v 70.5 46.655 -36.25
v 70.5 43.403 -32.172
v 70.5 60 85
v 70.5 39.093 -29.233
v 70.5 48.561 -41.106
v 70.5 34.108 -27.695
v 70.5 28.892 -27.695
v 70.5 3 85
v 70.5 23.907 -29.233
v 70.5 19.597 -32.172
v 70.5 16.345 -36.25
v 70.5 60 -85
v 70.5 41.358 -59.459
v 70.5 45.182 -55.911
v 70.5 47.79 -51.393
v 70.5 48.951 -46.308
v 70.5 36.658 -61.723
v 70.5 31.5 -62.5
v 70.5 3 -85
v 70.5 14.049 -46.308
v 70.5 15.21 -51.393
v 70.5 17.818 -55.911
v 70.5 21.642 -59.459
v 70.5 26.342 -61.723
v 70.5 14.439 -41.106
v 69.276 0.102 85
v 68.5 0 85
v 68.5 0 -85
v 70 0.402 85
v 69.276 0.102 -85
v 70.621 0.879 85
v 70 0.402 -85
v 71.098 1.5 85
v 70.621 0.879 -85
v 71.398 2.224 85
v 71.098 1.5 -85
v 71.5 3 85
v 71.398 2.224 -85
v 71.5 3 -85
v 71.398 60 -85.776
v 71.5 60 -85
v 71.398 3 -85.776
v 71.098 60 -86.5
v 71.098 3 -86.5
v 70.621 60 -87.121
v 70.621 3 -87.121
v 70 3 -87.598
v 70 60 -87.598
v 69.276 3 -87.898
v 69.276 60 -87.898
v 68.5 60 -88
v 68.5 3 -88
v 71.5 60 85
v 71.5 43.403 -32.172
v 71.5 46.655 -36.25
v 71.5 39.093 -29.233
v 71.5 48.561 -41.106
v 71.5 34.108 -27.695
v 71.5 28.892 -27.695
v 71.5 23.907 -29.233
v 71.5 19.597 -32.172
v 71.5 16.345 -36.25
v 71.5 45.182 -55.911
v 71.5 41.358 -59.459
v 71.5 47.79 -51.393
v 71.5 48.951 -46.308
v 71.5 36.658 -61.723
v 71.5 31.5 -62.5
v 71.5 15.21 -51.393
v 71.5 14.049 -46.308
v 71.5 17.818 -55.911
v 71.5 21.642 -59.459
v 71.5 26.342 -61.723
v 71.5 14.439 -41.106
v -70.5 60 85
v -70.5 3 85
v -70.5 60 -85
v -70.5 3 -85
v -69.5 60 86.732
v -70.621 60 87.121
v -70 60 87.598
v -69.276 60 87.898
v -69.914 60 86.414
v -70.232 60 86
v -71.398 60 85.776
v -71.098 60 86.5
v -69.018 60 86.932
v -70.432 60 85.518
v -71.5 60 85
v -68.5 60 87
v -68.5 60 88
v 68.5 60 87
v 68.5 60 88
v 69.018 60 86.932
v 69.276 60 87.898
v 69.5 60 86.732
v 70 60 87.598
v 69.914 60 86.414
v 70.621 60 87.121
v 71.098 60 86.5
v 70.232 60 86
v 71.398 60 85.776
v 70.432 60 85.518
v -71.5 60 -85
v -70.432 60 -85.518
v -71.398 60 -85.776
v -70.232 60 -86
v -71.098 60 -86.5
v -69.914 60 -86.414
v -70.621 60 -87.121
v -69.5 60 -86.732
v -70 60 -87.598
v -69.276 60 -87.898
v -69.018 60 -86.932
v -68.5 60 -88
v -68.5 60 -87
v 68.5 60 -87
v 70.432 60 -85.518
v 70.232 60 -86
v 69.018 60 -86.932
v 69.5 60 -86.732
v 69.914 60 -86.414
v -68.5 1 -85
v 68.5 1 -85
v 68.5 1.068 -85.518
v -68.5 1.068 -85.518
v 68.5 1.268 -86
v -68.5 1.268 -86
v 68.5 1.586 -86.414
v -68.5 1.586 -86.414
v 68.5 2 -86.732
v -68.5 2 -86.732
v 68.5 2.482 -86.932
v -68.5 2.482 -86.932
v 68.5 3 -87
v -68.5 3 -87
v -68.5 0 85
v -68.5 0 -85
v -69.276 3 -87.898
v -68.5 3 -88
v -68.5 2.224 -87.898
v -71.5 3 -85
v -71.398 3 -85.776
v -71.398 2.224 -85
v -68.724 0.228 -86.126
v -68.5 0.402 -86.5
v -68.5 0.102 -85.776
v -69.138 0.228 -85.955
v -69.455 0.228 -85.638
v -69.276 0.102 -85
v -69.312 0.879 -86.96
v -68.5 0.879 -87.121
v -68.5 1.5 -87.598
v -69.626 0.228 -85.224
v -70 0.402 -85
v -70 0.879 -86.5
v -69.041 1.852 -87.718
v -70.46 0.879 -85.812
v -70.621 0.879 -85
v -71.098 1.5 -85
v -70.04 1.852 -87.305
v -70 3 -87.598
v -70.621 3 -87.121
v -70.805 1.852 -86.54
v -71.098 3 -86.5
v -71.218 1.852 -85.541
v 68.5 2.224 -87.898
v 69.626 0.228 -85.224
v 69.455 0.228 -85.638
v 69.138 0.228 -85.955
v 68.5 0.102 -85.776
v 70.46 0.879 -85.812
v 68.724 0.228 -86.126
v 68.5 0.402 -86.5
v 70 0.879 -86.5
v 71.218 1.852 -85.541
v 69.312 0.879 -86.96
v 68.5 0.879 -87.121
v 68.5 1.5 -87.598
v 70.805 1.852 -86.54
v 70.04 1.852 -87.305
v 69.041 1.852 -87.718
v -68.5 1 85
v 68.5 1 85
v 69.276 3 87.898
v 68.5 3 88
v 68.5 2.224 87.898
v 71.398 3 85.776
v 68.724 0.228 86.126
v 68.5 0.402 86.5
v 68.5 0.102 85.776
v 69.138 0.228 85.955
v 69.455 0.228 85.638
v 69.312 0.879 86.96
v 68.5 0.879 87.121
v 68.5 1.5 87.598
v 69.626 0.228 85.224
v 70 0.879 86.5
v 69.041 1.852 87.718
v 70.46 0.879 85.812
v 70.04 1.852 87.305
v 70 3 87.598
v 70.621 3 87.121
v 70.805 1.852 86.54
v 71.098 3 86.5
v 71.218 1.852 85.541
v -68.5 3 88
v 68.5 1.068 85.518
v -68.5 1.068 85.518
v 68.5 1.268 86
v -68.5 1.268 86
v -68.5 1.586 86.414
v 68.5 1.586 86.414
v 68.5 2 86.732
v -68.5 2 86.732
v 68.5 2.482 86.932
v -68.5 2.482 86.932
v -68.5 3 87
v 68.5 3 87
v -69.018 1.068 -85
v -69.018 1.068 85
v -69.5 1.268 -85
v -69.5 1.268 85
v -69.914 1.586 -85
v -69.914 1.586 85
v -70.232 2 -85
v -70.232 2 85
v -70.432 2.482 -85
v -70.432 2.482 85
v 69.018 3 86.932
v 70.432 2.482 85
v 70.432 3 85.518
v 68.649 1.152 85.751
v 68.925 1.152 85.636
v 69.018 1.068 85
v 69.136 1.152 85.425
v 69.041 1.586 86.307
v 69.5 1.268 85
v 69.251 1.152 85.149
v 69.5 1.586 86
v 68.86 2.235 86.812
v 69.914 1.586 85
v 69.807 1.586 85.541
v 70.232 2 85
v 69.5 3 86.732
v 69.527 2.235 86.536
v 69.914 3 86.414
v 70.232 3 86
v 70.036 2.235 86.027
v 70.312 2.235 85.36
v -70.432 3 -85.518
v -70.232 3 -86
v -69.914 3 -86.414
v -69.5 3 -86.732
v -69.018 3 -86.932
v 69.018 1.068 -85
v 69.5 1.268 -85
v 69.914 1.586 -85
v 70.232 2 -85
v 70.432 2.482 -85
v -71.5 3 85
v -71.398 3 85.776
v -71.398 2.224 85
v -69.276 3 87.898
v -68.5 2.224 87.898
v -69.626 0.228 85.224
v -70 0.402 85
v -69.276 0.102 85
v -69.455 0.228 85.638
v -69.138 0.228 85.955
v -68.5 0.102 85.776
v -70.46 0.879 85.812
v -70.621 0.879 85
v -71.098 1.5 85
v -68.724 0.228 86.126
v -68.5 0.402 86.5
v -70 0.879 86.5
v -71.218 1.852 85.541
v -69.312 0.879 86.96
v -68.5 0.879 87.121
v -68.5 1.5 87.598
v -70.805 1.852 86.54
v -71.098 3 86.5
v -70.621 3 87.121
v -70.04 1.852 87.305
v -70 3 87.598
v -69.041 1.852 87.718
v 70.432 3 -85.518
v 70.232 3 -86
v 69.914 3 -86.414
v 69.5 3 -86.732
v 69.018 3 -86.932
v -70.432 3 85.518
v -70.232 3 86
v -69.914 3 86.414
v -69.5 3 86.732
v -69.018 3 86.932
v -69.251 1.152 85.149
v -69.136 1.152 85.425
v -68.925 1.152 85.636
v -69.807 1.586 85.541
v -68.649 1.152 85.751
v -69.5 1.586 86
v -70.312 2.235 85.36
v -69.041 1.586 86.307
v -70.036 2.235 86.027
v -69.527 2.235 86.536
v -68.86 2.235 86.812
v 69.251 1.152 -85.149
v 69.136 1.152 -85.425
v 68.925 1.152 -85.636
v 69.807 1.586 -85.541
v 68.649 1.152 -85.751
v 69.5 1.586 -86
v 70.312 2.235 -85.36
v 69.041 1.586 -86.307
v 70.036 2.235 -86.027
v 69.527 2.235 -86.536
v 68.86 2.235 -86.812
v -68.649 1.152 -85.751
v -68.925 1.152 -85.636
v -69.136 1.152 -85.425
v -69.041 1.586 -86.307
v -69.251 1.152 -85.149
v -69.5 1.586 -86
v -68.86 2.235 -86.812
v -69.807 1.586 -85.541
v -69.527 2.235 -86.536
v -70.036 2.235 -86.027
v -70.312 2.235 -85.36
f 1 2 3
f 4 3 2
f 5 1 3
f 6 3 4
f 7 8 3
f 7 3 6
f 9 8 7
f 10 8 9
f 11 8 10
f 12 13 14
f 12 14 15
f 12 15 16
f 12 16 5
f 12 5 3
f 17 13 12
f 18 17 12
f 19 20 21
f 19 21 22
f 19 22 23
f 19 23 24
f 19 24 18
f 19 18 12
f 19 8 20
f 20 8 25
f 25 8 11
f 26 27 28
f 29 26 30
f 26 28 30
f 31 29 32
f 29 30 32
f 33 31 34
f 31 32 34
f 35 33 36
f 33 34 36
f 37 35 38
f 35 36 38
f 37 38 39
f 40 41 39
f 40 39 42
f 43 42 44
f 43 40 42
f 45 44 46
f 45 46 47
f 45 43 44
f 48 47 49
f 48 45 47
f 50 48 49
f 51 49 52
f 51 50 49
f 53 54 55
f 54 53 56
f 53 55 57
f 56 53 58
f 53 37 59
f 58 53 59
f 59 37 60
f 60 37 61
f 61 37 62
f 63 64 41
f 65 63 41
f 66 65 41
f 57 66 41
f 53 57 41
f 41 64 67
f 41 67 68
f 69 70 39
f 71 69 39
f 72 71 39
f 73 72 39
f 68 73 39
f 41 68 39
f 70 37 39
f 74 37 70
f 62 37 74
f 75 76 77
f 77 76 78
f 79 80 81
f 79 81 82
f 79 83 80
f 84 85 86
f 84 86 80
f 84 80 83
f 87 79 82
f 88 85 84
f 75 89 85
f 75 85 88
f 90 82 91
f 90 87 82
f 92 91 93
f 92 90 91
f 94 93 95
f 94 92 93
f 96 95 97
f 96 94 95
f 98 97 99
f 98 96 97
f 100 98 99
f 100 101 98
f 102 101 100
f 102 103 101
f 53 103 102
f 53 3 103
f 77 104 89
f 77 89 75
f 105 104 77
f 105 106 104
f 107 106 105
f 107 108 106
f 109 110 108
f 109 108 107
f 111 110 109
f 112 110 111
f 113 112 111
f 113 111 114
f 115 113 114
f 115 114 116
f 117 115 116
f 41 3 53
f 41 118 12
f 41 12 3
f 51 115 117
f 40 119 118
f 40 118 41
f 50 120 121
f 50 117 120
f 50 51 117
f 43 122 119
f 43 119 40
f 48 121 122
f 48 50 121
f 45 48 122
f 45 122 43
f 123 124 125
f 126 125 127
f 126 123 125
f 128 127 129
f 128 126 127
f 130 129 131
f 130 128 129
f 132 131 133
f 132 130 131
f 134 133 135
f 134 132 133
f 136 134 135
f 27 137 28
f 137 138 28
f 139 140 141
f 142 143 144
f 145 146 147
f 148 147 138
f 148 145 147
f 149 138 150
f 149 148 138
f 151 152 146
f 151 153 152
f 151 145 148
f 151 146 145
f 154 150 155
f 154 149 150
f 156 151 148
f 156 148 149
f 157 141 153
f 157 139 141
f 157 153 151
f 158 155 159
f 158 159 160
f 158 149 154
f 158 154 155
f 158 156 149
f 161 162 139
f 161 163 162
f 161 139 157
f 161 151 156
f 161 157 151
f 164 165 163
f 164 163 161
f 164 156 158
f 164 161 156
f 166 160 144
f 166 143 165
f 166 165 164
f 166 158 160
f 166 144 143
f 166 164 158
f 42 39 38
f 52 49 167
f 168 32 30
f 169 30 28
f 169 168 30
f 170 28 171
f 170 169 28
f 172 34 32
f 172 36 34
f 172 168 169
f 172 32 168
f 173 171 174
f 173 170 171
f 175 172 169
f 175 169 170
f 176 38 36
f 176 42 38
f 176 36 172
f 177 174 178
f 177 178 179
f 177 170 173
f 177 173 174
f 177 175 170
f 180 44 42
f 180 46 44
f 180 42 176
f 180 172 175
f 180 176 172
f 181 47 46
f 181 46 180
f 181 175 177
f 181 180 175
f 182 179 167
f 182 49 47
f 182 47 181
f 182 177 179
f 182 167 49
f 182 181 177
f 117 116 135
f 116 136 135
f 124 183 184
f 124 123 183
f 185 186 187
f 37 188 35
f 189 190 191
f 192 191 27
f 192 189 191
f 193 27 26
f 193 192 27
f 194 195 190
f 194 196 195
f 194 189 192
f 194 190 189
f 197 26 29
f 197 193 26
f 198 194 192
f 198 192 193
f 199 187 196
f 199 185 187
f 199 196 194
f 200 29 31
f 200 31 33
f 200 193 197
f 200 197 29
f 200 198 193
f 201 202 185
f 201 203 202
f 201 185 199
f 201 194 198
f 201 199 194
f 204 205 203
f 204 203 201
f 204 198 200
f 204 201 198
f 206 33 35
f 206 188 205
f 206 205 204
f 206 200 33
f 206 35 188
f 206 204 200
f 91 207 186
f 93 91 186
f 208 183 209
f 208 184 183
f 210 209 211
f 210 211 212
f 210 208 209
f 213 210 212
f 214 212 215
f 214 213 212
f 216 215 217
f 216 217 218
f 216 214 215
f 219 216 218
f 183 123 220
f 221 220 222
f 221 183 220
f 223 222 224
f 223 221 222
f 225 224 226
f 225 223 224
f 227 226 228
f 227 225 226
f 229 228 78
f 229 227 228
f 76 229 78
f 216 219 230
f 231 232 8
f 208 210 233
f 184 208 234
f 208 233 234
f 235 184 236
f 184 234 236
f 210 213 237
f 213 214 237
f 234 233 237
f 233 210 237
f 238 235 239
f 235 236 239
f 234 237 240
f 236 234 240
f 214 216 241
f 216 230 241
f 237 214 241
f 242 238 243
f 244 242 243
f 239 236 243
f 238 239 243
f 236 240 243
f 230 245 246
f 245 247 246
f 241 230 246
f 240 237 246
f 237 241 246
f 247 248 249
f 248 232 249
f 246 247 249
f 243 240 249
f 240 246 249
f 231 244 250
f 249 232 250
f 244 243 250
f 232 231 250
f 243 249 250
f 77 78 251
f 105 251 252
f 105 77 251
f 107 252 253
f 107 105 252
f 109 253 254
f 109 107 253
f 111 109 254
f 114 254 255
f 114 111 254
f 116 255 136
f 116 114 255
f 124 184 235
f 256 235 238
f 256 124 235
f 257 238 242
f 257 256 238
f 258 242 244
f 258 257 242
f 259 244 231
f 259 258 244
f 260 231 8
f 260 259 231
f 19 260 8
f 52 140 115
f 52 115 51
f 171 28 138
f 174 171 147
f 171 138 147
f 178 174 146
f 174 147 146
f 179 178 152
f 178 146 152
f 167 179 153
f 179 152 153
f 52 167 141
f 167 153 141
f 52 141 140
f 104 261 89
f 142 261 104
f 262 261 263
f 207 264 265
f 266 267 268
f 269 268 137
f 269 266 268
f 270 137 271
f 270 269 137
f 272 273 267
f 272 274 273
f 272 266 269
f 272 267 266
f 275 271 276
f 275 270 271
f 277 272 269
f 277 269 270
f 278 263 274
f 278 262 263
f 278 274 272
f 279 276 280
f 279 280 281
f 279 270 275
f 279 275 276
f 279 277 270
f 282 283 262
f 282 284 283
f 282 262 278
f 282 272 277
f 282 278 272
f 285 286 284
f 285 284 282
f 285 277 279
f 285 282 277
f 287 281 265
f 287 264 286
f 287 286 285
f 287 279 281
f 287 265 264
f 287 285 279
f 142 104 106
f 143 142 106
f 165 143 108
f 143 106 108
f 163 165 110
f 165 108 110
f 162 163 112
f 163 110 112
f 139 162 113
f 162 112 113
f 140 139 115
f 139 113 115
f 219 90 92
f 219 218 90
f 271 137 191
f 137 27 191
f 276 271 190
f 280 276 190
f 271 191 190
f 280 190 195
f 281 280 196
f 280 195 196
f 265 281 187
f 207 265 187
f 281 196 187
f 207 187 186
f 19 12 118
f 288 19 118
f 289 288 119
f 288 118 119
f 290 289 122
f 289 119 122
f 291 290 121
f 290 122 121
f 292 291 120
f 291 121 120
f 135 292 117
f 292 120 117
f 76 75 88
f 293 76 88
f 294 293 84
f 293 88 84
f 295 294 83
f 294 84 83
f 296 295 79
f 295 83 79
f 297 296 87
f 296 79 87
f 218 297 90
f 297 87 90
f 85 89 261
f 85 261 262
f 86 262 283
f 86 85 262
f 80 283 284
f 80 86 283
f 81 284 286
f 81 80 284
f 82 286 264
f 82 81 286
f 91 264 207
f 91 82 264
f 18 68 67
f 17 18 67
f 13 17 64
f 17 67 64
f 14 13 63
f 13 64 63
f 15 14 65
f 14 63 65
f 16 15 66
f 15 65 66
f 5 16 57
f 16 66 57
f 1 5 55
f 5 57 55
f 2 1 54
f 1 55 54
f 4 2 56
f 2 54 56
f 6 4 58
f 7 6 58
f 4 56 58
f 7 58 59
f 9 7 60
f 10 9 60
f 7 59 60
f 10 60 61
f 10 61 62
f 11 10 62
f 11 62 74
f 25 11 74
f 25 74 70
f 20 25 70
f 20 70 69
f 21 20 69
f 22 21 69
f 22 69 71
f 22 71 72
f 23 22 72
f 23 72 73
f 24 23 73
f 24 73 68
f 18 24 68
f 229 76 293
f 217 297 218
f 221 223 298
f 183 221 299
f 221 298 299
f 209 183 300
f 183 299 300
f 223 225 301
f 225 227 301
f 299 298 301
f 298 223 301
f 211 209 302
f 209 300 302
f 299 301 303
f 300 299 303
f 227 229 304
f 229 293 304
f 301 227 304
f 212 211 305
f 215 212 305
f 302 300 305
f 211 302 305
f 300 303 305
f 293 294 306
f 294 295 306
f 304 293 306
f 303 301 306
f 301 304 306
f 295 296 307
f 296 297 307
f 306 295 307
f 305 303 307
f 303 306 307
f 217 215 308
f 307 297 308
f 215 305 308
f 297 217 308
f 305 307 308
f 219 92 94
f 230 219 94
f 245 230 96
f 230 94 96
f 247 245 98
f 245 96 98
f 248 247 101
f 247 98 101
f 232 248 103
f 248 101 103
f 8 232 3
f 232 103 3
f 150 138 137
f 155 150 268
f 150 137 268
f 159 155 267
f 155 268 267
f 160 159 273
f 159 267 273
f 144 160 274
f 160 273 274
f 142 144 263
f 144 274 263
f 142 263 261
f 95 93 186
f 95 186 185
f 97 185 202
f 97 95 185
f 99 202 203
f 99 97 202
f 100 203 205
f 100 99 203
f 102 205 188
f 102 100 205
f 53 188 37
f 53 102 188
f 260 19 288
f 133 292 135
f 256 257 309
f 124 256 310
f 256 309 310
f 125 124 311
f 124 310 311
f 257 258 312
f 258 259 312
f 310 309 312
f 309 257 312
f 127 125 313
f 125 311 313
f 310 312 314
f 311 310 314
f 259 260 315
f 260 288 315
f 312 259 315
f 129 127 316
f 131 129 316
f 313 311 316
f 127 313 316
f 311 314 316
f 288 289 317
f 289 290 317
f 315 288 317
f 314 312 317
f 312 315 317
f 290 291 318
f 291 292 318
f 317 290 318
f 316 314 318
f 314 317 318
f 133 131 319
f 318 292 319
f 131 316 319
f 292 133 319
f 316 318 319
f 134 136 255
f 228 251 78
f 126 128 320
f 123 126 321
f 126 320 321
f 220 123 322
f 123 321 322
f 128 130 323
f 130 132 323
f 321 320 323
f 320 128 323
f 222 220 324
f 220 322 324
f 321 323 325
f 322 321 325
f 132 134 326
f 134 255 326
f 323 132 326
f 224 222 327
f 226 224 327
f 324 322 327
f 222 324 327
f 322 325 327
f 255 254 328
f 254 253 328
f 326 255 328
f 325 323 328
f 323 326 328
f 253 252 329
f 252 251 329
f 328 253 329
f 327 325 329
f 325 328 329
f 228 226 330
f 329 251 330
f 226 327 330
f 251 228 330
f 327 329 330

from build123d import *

# Parameters (mm, degrees)
SKETCH1_W           = 143
SKETCH1_H           = 176
BOSS_EXTRUDE1_DEPTH = 60
FILLET1_R           = 3
FILLET2_R           = 3
SHELL1_T            = -1
SKETCH2_R           = 17.5
CUT_EXTRUDE1_DEPTH  = 60


with BuildPart() as part:
    # Sketch1 → Boss-Extrude1 (new body)
    with BuildSketch(Plane(origin=(0, 0, 0), x_dir=(1, 0, 0), z_dir=(0, 1, 0))):
        Rectangle(SKETCH1_W, SKETCH1_H)
    extrude(amount=BOSS_EXTRUDE1_DEPTH)

    # Fillet1
    fillet1_edges = [part.edges().sort_by_distance(p)[0] for p in [
        (71.5, 30, 88),
        (-71.5, 30, 88),
        (-71.5, 30, -88),
        (71.5, 30, -88),
    ]]
    fillet(fillet1_edges, radius=FILLET1_R)

    # Fillet2
    fillet2_edges = [part.edges().sort_by_distance(p)[0] for p in [
        (0, 0, 88),
        (71.5, 0, 0),
        (-71.5, 0, 0),
        (0, 0, -88),
        (-70.621320344, 0, -87.121320344),
        (70.621320344, 0, -87.121320344),
        (70.621320344, 0, 87.121320344),
        (-70.621320344, 0, 87.121320344),
    ]]
    fillet(fillet2_edges, radius=FILLET2_R)

    # Shell1
    shell1_openings = [part.faces().sort_by_distance(p)[0] for p in [
        (0, 60, 0),
    ]]
    offset(amount=SHELL1_T, openings=shell1_openings, kind=Kind.INTERSECTION)

    # Sketch2 → Cut-Extrude1 (cut)
    with BuildSketch(Plane(origin=(71.5, 0, 0), x_dir=(0, 0, -1), z_dir=(1, 0, 0))):
        with Locations((45, 31.5)):
            Circle(SKETCH2_R)
    extrude(amount=-CUT_EXTRUDE1_DEPTH, mode=Mode.SUBTRACT)


solid = part.part
